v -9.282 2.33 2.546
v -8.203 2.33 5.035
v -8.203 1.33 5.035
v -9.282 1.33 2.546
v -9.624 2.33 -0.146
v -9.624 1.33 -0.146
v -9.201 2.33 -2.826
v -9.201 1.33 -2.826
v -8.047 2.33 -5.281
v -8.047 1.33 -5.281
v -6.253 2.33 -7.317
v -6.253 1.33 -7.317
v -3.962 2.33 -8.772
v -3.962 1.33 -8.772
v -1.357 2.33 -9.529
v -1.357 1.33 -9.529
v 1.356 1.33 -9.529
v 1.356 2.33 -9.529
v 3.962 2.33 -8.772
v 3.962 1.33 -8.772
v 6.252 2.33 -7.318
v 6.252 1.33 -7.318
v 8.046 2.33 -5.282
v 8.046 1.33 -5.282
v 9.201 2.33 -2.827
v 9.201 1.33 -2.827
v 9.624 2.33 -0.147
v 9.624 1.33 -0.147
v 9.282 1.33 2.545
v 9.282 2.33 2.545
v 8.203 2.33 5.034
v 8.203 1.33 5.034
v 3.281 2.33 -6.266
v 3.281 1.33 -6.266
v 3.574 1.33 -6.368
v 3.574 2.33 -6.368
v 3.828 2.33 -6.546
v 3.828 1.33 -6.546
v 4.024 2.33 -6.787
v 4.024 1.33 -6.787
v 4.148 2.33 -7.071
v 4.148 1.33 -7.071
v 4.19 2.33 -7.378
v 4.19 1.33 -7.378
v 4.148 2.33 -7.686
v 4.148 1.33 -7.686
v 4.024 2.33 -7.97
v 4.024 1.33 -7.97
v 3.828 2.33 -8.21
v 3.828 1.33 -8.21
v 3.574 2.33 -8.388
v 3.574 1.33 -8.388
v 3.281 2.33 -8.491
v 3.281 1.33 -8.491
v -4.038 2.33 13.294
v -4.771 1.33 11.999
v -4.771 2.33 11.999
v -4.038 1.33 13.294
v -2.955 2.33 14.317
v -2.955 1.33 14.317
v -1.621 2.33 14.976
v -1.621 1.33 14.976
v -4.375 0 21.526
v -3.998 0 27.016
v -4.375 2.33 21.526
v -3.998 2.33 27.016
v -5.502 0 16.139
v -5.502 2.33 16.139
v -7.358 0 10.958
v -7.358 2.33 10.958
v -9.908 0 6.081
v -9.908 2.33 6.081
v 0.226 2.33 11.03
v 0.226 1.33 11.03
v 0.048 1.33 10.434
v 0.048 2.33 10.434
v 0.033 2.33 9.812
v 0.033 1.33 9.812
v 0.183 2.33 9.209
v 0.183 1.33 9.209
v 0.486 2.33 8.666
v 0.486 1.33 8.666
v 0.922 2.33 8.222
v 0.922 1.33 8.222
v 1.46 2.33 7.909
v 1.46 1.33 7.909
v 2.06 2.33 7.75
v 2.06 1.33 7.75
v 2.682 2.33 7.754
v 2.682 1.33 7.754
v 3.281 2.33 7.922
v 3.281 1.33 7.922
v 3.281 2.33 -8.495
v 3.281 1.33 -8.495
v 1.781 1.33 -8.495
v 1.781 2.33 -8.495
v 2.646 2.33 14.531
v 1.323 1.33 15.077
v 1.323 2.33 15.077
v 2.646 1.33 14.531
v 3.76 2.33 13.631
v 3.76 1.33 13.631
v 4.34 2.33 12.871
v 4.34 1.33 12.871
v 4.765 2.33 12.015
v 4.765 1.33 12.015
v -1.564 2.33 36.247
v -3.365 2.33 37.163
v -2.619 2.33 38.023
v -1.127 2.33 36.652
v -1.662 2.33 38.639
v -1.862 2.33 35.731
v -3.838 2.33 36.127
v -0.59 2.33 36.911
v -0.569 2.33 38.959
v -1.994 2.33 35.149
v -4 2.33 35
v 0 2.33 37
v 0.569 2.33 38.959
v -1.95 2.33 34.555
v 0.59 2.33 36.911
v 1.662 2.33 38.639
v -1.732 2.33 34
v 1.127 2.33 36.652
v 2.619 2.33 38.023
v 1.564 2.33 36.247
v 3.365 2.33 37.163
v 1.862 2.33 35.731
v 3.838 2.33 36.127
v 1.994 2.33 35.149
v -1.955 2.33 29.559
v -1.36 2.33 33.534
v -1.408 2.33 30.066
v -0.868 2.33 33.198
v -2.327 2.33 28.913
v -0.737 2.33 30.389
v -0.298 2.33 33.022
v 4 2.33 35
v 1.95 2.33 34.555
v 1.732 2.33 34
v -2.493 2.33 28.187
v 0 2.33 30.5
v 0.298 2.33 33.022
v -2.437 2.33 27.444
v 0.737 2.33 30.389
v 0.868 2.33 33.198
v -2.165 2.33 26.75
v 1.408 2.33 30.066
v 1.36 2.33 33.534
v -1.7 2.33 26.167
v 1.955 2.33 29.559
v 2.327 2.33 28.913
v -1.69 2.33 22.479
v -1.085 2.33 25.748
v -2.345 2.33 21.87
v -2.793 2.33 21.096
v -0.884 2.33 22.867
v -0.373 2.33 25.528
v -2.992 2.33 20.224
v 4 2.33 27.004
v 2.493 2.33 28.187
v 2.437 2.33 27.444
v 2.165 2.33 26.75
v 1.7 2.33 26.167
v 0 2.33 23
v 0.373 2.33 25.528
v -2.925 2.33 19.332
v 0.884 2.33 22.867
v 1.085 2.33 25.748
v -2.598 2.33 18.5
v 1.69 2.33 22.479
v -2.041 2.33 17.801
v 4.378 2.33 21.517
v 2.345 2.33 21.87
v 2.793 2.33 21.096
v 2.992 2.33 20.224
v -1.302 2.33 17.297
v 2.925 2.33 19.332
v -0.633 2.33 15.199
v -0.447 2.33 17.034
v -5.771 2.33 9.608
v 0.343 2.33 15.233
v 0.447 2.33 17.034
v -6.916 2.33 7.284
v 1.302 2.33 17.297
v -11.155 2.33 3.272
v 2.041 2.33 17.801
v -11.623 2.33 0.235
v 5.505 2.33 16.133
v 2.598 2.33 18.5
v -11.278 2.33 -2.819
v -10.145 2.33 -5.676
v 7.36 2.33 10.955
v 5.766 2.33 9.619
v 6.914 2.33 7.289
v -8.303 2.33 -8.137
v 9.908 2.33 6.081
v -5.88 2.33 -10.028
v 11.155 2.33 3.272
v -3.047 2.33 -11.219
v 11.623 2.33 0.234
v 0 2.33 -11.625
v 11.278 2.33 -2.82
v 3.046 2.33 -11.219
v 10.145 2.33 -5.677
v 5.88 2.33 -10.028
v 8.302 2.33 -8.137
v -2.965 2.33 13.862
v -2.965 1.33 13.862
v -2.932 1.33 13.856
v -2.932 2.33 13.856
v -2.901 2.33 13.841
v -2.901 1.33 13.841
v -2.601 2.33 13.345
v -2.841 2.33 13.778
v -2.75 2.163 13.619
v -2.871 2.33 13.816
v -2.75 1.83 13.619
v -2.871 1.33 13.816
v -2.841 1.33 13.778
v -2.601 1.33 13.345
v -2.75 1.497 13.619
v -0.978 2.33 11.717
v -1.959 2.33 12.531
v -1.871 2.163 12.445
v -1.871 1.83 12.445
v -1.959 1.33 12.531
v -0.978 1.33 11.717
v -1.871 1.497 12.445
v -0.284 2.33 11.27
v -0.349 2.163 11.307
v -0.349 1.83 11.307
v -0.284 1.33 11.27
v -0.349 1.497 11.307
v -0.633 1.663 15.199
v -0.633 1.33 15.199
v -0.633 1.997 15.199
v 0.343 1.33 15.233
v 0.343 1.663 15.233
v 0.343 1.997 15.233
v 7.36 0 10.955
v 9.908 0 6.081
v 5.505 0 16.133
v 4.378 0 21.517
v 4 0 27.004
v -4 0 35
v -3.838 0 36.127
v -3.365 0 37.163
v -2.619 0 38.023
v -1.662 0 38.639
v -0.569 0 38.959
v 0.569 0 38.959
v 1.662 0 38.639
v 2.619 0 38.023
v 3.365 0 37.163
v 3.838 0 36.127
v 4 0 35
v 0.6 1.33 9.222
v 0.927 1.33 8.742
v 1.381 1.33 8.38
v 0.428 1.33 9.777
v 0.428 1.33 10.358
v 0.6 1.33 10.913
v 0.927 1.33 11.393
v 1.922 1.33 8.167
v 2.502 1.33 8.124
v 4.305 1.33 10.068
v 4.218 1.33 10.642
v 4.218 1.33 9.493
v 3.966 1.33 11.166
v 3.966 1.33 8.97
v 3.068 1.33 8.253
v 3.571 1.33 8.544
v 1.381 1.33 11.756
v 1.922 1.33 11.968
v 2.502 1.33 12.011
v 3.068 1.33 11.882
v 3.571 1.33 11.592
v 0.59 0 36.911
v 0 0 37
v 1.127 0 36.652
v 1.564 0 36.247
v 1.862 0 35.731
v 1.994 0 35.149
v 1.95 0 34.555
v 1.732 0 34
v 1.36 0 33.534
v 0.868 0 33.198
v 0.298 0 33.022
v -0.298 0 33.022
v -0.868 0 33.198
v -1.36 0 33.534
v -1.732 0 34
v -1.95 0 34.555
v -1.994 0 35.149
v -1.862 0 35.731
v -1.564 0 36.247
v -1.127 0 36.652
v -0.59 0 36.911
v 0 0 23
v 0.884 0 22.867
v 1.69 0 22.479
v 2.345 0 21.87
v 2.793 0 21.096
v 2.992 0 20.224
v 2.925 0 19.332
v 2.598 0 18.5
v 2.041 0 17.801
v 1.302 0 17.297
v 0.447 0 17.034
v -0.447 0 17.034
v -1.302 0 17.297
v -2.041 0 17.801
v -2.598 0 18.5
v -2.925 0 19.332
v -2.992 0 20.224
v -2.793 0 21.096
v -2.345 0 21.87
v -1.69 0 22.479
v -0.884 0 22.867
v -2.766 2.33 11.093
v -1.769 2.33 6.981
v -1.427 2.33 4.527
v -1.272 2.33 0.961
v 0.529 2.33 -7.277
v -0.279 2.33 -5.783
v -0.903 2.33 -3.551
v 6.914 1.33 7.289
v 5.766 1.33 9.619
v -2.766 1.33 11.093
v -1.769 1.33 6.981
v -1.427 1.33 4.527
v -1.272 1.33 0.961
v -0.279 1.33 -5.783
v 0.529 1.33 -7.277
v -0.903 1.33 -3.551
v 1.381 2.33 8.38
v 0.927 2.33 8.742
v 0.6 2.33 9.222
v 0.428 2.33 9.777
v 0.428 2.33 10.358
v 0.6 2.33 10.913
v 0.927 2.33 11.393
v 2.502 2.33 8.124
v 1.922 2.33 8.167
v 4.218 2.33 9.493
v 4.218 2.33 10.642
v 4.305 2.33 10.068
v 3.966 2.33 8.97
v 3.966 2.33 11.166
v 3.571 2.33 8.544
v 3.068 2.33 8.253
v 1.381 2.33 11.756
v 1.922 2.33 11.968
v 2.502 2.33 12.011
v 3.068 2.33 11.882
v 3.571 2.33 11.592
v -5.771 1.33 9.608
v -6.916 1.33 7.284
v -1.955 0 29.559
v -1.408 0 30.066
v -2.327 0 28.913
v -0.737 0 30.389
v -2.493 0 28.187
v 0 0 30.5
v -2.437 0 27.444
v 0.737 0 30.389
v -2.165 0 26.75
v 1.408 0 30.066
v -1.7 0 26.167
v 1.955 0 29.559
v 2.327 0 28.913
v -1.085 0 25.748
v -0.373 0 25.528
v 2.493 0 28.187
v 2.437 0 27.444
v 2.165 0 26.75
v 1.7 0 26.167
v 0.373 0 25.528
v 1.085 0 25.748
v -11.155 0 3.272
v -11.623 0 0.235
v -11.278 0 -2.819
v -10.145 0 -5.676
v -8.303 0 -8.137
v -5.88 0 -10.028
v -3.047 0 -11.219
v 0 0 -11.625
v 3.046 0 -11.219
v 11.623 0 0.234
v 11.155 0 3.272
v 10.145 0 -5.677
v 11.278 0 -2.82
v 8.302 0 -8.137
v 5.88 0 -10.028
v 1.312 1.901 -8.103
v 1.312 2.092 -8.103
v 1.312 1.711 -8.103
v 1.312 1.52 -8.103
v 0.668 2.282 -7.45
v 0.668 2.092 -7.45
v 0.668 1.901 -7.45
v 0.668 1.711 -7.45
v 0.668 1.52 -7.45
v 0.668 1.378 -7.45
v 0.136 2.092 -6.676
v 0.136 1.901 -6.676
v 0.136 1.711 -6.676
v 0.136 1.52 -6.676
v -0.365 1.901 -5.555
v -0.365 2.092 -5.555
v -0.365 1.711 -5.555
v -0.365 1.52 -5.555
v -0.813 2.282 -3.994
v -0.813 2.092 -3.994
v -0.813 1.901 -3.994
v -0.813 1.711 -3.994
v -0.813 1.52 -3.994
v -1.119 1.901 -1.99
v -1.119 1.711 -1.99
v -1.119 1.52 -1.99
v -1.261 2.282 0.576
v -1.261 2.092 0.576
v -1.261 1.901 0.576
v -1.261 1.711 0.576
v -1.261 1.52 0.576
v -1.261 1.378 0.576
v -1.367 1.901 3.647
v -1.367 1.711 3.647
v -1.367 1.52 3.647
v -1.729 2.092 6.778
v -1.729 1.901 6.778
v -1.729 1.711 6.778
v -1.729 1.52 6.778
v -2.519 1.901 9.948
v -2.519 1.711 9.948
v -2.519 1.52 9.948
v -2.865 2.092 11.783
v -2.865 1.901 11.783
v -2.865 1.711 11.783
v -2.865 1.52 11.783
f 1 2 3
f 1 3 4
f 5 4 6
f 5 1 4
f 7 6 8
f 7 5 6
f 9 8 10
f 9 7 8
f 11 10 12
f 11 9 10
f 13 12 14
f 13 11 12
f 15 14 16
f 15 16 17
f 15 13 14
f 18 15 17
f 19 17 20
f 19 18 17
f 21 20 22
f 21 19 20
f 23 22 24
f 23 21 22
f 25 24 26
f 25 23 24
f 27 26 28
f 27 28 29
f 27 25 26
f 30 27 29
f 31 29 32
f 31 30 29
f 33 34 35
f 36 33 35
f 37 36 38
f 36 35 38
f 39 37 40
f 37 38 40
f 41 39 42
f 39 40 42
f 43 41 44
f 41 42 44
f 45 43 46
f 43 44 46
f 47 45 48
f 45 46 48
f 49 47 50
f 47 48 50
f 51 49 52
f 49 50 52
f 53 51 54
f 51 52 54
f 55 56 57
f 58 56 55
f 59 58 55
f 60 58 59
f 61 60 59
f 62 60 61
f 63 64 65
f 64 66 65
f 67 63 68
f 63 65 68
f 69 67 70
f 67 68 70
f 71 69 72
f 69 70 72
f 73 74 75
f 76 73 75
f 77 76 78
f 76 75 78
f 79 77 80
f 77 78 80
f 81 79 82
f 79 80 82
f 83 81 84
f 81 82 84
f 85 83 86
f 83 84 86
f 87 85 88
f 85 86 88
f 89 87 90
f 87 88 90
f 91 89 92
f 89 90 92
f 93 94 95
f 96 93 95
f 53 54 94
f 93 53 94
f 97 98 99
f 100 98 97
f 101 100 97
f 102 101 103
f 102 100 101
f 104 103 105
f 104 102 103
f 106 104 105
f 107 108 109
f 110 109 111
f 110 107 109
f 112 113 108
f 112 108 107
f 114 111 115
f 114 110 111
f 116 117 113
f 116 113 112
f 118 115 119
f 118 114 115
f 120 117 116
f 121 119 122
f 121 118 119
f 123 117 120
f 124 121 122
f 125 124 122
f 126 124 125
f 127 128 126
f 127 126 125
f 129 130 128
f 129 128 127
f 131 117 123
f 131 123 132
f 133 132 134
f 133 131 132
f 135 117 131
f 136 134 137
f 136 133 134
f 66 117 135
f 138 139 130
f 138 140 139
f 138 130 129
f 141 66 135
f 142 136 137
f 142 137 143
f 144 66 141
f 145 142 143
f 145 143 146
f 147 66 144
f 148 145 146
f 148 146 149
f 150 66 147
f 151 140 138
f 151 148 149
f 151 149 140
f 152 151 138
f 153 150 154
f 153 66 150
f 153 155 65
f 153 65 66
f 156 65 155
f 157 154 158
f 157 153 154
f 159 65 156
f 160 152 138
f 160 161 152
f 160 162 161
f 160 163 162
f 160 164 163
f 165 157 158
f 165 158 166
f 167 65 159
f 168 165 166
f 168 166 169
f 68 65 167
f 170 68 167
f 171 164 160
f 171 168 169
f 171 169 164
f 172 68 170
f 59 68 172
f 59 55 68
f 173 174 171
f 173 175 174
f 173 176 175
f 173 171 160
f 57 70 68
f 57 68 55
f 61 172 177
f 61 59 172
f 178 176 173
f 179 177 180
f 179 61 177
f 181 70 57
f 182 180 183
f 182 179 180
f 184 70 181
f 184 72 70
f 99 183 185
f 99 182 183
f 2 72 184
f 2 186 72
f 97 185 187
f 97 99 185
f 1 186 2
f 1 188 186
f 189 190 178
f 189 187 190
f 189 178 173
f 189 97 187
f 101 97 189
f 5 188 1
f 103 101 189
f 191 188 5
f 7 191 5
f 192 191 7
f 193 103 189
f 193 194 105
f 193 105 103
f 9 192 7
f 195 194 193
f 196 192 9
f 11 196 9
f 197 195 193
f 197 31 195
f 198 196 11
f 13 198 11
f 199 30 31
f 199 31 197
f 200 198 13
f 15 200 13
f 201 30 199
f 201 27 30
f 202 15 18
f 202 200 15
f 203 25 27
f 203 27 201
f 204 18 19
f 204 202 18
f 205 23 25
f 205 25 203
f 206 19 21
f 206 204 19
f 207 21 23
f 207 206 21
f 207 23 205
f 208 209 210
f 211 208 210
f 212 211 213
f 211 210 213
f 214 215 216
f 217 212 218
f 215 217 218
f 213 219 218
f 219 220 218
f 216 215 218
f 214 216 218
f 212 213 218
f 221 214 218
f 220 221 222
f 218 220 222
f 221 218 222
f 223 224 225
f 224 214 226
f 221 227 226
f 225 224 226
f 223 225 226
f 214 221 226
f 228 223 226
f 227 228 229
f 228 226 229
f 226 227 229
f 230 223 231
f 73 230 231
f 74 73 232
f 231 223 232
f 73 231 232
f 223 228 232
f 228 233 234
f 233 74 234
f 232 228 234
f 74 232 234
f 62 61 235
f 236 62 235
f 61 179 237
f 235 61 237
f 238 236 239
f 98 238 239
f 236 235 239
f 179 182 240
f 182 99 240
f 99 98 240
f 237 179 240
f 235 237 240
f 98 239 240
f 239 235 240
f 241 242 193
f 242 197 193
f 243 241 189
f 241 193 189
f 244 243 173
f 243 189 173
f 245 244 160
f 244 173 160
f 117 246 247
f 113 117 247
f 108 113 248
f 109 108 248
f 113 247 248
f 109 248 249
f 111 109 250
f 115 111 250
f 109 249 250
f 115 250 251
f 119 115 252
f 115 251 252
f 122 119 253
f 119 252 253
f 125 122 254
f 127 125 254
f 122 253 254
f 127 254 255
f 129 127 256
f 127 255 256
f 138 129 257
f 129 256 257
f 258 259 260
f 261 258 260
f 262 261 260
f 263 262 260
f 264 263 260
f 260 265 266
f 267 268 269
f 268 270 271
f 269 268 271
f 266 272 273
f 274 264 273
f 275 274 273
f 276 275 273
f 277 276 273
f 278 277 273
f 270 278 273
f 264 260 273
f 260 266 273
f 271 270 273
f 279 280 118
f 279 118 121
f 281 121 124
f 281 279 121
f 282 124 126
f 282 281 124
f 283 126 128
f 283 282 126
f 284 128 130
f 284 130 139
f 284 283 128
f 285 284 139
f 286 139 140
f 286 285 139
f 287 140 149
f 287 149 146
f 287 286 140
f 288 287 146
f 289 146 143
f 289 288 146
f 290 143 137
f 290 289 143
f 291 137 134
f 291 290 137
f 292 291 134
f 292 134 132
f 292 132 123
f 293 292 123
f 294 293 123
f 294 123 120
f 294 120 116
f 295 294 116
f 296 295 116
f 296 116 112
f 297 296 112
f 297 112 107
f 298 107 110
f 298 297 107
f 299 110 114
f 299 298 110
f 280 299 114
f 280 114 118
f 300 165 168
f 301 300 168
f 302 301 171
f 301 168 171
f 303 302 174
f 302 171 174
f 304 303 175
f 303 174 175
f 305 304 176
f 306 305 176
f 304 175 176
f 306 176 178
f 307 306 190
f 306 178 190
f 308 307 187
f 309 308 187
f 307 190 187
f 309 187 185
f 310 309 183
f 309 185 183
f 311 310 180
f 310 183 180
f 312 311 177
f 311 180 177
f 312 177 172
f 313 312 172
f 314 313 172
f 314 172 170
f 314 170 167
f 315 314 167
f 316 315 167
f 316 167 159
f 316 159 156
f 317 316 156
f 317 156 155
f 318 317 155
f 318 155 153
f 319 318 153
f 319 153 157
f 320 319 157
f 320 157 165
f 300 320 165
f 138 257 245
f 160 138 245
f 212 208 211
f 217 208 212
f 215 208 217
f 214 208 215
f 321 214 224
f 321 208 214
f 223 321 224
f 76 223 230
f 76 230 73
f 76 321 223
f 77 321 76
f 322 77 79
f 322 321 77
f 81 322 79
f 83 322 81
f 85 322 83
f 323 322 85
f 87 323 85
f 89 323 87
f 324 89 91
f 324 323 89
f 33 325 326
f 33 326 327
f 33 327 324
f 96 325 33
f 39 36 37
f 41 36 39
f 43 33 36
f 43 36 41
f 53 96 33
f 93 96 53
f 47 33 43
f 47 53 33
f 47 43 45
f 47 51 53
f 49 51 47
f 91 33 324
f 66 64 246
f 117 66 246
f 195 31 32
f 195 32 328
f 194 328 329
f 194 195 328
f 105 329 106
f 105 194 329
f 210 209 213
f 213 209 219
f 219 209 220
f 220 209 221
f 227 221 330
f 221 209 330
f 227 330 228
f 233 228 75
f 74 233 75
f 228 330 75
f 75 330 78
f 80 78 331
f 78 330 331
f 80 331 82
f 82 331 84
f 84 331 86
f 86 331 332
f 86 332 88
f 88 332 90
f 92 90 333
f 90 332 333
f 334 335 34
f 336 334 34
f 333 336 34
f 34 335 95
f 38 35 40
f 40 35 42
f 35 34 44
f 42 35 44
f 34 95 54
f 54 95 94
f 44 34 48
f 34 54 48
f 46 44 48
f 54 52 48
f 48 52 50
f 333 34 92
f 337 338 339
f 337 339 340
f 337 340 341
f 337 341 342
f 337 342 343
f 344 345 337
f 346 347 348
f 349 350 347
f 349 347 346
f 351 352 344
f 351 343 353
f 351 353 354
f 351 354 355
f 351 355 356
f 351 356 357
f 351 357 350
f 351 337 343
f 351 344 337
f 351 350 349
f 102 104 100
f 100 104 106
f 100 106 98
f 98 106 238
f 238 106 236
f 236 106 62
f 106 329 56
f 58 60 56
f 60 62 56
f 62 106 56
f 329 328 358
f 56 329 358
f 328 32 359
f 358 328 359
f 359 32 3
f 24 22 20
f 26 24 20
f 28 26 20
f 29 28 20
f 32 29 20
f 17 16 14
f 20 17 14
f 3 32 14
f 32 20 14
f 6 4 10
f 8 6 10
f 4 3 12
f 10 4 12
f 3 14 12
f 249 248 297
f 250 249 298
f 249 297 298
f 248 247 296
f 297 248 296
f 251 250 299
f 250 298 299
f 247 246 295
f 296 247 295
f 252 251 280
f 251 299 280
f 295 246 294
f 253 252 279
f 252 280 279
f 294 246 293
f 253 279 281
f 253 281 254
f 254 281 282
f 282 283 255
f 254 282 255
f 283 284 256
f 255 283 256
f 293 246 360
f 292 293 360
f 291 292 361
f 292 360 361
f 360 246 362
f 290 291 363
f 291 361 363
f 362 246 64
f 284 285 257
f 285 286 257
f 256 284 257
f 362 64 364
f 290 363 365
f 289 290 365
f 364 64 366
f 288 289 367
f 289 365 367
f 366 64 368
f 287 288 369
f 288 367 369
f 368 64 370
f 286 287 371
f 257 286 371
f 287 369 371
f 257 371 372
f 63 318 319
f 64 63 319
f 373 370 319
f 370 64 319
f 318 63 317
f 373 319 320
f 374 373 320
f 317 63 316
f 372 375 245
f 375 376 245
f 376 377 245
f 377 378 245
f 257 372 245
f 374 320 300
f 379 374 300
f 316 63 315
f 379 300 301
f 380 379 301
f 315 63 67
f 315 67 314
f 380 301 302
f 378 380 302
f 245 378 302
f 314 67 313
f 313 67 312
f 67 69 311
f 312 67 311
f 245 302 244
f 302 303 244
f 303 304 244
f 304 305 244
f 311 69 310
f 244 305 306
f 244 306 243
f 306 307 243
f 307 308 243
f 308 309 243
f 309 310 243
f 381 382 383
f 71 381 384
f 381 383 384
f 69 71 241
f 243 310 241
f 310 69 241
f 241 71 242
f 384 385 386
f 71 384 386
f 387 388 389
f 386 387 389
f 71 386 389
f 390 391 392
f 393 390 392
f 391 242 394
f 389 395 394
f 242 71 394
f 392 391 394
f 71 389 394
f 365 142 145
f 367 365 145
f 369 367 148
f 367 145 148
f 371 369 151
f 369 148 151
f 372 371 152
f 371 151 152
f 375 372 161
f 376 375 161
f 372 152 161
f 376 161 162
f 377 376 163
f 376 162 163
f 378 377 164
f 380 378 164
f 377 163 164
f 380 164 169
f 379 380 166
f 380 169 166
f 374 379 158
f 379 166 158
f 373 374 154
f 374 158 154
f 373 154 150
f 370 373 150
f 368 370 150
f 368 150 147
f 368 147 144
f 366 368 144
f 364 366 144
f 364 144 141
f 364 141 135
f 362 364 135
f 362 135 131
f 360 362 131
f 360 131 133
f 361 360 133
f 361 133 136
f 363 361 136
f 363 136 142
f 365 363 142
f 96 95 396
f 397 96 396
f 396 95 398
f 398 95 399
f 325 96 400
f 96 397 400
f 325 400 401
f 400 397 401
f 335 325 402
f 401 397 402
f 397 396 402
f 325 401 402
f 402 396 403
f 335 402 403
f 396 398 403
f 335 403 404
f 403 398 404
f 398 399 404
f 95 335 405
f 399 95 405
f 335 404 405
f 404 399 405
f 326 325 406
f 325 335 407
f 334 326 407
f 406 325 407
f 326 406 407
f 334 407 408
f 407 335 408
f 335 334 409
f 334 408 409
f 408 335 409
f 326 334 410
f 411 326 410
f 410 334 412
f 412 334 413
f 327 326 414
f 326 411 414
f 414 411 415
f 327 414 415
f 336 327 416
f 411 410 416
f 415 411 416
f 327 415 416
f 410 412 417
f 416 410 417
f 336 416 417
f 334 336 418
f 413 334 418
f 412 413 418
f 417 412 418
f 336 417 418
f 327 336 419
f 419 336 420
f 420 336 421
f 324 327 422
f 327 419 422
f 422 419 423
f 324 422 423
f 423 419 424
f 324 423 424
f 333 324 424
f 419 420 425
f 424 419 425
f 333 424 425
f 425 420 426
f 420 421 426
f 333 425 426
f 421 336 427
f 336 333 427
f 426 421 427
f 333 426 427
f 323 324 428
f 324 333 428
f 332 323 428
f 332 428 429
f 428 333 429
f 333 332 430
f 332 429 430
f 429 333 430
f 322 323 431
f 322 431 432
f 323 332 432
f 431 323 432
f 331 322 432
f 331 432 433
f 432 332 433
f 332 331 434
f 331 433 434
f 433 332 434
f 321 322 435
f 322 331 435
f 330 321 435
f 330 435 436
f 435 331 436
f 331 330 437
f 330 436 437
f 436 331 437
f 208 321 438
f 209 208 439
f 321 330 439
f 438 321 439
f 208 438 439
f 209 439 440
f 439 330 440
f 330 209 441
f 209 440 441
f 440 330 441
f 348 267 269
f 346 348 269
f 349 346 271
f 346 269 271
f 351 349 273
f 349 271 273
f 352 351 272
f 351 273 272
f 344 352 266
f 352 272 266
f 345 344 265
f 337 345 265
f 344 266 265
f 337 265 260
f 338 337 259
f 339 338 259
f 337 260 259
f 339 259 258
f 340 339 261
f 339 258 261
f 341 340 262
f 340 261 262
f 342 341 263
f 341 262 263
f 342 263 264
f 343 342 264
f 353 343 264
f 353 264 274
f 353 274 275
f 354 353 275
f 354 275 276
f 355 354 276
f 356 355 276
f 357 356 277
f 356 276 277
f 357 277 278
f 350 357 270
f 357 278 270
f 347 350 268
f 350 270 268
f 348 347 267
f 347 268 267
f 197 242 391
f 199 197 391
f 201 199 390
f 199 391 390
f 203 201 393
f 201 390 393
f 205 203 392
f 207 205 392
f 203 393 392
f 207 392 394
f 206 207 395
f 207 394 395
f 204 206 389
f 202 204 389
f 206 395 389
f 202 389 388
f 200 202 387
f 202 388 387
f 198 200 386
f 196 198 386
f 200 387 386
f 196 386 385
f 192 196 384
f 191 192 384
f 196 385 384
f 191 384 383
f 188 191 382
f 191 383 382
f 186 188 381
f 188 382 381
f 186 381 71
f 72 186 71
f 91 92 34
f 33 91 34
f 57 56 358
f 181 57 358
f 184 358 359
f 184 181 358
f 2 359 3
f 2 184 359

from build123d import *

# Parameters (mm, degrees)
SKETCH1_R               = 2
BOSS_EXTRUDE1_DEPTH     = 2.33
FILLET1_R               = 40
SKETCH3_R               = 2.5
SKETCH3_R_2             = 3
CUT_EXTRUDE1_DEPTH      = 41.762354262
CUT_EXTRUDE3_DEPTH      = 1
BOSS_EXTRUDE3_START     = -1
BOSS_EXTRUDE3_OUTLINE_R = 1.949204175
BOSS_EXTRUDE3_DEPTH     = 1
FILLET2_R               = 5


# Read off the part's stored shape, not the designer's step: Boss-Extrude3
with BuildPart() as part:
    # Sketch1 → Boss-Extrude1 (new body)
    with BuildSketch(Plane(origin=(0, 0, 0), x_dir=(1, 0, 0), z_dir=(0, 1, 0))):
        with BuildLine():
            Line((-3.993715603, -10.917456695), (-4, -35))
            ThreePointArc((-4, -35), (0, -39), (4, -35))
            Line((4, -35), (3.999256749, -10.915428093))
            ThreePointArc((3.999256749, -10.915428093), (-0.002950403, 11.624999626), (-3.993715603, -10.917456695))
        make_face()
        with Locations(Location((0, -35, 0), (0, 0, 270))):
            Circle(SKETCH1_R, mode=Mode.SUBTRACT)
    extrude(amount=BOSS_EXTRUDE1_DEPTH)

    # Fillet1
    fillet1_edges = [part.edges().sort_by_distance(p)[0] for p in [
        (3.999256749, 1.165, 10.915428093),
        (-3.993715603, 1.165, 10.917456695),
    ]]
    fillet(fillet1_edges, radius=FILLET1_R)

    # Sketch3 → Cut-Extrude1 (cut, through all)
    with BuildSketch(Plane(origin=(0, 2.33, 0), x_dir=(1, 0, 0), z_dir=(0, 1, 0))):
        with Locations(Location((0, -28, 0), (0, 0, 270))):
            Circle(SKETCH3_R)
        with Locations(Location((0, -20, 0), (0, 0, 270))):
            Circle(SKETCH3_R_2)
    extrude(amount=-CUT_EXTRUDE1_DEPTH, mode=Mode.SUBTRACT)

    # Sketch12 → Cut-Extrude3 (cut)
    with BuildSketch(Plane(origin=(0, 2.33, 0), x_dir=(1, 0, 0), z_dir=(0, 1, 0))):
        with BuildLine():
            ThreePointArc((8.203343823, -5.034458772), (5.941708971, -9.23828641), (4.171703771, -13.671596755))
            add(Edge.make_bspline(
                [(-4.187068138, -13.623308604), (-1.141891972, -15.774669541), (1.16463665, -15.774669541), (4.171703771, -13.671596755)],
                knots=[0, 0, 0, 0, 1, 1, 1, 1], degree=3))
            ThreePointArc((-4.187068138, -13.623308604), (-5.951923746, -9.215482827), (-8.203001159, -5.035017078))
            ThreePointArc((-8.203001159, -5.035017078), (-0.000327538, 9.624999994), (8.203343823, -5.034458772))
        make_face()
    extrude(amount=-CUT_EXTRUDE3_DEPTH, mode=Mode.SUBTRACT)

    # Fillet2
    fillet2_edges = [part.edges().sort_by_distance(p)[0] for p in [
        (4.171703771, 1.83, 13.671596755),
        (-4.187068138, 1.83, 13.623308604),
    ]]
    fillet(fillet2_edges, radius=FILLET2_R)


with BuildPart() as body_2:
    # Boss-Extrude3 outline → Boss-Extrude3 (new body)
    with BuildSketch(Plane(origin=(0, 2.33, 0), x_dir=(1, 0, 0), z_dir=(0, 1, 0)).offset(BOSS_EXTRUDE3_START)):
        with BuildLine():
            Line((3.281117116, 8.494925514), (1.781117116, 8.494925514))
            add(Edge.make_bspline(
                [(1.781117116, 8.494925514), (1.183180059, 8.004689197), (0.982734781, 7.851579078), (0.615420043, 7.446266263), (0.33043447, 7.110616589), (0.1467771, 6.857296079), (-0.083510311, 6.454804461), (-0.339895148, 5.961263649), (-0.668740254, 5.130149544), (-0.942295018, 4.231326747), (-1.147855824, 3.080080282), (-1.28640882, 2.292482291), (-1.28640882, 1.551154161), (-1.373920485, 0.287096774), (-1.453784327, -1.929298886), (-0.777696731, -4.107146497), (-1.586776077, -5.484260387), (-1.314293328, -6.862486953), (-1.564788612, -7.973016044), (-3.159608585, -9.676383972), (-2.893209822, -11.679284919), (-2.964841412, -13.861545101)],
                knots=[0, 0, 0, 0, 0, 0, 0, 0, 0, 0, 0, 0, 0, 0, 0, 0, 0, 0, 0, 0, 0, 0, 1, 1, 1, 1, 1, 1, 1, 1, 1, 1, 1, 1, 1, 1, 1, 1, 1, 1, 1, 1, 1, 1], degree=21))
            add(Edge.make_bspline(
                [(-2.964841412, -13.861545101), (-2.68941343, -13.857740882), (-2.764683546, -13.138994944), (-2.086029899, -12.417028626), (-1.115412929, -11.751425652), (-0.16044275, -11.127005362), (0.226117199, -11.029671441)],
                knots=[0, 0, 0, 0, 0, 0, 0, 1, 1, 1, 1, 1, 1, 1], degree=6))
            ThreePointArc((0.226117199, -11.029671441), (0.689271081, -8.429488184), (3.281117116, -7.921749452))
            Line((3.281117116, -7.921749452), (3.281117116, 6.265660141))
            ThreePointArc((3.281117116, 6.265660141), (4.190467303, 7.378260653), (3.281117116, 8.490861165))
            Line((3.281117116, 8.490861165), (3.281117116, 8.494925514))
        make_face()
        with Locations((2.355847123, -10.067685567)):
            Circle(BOSS_EXTRUDE3_OUTLINE_R)
    extrude(amount=BOSS_EXTRUDE3_DEPTH)


solid = Compound([part.part, body_2.part])
